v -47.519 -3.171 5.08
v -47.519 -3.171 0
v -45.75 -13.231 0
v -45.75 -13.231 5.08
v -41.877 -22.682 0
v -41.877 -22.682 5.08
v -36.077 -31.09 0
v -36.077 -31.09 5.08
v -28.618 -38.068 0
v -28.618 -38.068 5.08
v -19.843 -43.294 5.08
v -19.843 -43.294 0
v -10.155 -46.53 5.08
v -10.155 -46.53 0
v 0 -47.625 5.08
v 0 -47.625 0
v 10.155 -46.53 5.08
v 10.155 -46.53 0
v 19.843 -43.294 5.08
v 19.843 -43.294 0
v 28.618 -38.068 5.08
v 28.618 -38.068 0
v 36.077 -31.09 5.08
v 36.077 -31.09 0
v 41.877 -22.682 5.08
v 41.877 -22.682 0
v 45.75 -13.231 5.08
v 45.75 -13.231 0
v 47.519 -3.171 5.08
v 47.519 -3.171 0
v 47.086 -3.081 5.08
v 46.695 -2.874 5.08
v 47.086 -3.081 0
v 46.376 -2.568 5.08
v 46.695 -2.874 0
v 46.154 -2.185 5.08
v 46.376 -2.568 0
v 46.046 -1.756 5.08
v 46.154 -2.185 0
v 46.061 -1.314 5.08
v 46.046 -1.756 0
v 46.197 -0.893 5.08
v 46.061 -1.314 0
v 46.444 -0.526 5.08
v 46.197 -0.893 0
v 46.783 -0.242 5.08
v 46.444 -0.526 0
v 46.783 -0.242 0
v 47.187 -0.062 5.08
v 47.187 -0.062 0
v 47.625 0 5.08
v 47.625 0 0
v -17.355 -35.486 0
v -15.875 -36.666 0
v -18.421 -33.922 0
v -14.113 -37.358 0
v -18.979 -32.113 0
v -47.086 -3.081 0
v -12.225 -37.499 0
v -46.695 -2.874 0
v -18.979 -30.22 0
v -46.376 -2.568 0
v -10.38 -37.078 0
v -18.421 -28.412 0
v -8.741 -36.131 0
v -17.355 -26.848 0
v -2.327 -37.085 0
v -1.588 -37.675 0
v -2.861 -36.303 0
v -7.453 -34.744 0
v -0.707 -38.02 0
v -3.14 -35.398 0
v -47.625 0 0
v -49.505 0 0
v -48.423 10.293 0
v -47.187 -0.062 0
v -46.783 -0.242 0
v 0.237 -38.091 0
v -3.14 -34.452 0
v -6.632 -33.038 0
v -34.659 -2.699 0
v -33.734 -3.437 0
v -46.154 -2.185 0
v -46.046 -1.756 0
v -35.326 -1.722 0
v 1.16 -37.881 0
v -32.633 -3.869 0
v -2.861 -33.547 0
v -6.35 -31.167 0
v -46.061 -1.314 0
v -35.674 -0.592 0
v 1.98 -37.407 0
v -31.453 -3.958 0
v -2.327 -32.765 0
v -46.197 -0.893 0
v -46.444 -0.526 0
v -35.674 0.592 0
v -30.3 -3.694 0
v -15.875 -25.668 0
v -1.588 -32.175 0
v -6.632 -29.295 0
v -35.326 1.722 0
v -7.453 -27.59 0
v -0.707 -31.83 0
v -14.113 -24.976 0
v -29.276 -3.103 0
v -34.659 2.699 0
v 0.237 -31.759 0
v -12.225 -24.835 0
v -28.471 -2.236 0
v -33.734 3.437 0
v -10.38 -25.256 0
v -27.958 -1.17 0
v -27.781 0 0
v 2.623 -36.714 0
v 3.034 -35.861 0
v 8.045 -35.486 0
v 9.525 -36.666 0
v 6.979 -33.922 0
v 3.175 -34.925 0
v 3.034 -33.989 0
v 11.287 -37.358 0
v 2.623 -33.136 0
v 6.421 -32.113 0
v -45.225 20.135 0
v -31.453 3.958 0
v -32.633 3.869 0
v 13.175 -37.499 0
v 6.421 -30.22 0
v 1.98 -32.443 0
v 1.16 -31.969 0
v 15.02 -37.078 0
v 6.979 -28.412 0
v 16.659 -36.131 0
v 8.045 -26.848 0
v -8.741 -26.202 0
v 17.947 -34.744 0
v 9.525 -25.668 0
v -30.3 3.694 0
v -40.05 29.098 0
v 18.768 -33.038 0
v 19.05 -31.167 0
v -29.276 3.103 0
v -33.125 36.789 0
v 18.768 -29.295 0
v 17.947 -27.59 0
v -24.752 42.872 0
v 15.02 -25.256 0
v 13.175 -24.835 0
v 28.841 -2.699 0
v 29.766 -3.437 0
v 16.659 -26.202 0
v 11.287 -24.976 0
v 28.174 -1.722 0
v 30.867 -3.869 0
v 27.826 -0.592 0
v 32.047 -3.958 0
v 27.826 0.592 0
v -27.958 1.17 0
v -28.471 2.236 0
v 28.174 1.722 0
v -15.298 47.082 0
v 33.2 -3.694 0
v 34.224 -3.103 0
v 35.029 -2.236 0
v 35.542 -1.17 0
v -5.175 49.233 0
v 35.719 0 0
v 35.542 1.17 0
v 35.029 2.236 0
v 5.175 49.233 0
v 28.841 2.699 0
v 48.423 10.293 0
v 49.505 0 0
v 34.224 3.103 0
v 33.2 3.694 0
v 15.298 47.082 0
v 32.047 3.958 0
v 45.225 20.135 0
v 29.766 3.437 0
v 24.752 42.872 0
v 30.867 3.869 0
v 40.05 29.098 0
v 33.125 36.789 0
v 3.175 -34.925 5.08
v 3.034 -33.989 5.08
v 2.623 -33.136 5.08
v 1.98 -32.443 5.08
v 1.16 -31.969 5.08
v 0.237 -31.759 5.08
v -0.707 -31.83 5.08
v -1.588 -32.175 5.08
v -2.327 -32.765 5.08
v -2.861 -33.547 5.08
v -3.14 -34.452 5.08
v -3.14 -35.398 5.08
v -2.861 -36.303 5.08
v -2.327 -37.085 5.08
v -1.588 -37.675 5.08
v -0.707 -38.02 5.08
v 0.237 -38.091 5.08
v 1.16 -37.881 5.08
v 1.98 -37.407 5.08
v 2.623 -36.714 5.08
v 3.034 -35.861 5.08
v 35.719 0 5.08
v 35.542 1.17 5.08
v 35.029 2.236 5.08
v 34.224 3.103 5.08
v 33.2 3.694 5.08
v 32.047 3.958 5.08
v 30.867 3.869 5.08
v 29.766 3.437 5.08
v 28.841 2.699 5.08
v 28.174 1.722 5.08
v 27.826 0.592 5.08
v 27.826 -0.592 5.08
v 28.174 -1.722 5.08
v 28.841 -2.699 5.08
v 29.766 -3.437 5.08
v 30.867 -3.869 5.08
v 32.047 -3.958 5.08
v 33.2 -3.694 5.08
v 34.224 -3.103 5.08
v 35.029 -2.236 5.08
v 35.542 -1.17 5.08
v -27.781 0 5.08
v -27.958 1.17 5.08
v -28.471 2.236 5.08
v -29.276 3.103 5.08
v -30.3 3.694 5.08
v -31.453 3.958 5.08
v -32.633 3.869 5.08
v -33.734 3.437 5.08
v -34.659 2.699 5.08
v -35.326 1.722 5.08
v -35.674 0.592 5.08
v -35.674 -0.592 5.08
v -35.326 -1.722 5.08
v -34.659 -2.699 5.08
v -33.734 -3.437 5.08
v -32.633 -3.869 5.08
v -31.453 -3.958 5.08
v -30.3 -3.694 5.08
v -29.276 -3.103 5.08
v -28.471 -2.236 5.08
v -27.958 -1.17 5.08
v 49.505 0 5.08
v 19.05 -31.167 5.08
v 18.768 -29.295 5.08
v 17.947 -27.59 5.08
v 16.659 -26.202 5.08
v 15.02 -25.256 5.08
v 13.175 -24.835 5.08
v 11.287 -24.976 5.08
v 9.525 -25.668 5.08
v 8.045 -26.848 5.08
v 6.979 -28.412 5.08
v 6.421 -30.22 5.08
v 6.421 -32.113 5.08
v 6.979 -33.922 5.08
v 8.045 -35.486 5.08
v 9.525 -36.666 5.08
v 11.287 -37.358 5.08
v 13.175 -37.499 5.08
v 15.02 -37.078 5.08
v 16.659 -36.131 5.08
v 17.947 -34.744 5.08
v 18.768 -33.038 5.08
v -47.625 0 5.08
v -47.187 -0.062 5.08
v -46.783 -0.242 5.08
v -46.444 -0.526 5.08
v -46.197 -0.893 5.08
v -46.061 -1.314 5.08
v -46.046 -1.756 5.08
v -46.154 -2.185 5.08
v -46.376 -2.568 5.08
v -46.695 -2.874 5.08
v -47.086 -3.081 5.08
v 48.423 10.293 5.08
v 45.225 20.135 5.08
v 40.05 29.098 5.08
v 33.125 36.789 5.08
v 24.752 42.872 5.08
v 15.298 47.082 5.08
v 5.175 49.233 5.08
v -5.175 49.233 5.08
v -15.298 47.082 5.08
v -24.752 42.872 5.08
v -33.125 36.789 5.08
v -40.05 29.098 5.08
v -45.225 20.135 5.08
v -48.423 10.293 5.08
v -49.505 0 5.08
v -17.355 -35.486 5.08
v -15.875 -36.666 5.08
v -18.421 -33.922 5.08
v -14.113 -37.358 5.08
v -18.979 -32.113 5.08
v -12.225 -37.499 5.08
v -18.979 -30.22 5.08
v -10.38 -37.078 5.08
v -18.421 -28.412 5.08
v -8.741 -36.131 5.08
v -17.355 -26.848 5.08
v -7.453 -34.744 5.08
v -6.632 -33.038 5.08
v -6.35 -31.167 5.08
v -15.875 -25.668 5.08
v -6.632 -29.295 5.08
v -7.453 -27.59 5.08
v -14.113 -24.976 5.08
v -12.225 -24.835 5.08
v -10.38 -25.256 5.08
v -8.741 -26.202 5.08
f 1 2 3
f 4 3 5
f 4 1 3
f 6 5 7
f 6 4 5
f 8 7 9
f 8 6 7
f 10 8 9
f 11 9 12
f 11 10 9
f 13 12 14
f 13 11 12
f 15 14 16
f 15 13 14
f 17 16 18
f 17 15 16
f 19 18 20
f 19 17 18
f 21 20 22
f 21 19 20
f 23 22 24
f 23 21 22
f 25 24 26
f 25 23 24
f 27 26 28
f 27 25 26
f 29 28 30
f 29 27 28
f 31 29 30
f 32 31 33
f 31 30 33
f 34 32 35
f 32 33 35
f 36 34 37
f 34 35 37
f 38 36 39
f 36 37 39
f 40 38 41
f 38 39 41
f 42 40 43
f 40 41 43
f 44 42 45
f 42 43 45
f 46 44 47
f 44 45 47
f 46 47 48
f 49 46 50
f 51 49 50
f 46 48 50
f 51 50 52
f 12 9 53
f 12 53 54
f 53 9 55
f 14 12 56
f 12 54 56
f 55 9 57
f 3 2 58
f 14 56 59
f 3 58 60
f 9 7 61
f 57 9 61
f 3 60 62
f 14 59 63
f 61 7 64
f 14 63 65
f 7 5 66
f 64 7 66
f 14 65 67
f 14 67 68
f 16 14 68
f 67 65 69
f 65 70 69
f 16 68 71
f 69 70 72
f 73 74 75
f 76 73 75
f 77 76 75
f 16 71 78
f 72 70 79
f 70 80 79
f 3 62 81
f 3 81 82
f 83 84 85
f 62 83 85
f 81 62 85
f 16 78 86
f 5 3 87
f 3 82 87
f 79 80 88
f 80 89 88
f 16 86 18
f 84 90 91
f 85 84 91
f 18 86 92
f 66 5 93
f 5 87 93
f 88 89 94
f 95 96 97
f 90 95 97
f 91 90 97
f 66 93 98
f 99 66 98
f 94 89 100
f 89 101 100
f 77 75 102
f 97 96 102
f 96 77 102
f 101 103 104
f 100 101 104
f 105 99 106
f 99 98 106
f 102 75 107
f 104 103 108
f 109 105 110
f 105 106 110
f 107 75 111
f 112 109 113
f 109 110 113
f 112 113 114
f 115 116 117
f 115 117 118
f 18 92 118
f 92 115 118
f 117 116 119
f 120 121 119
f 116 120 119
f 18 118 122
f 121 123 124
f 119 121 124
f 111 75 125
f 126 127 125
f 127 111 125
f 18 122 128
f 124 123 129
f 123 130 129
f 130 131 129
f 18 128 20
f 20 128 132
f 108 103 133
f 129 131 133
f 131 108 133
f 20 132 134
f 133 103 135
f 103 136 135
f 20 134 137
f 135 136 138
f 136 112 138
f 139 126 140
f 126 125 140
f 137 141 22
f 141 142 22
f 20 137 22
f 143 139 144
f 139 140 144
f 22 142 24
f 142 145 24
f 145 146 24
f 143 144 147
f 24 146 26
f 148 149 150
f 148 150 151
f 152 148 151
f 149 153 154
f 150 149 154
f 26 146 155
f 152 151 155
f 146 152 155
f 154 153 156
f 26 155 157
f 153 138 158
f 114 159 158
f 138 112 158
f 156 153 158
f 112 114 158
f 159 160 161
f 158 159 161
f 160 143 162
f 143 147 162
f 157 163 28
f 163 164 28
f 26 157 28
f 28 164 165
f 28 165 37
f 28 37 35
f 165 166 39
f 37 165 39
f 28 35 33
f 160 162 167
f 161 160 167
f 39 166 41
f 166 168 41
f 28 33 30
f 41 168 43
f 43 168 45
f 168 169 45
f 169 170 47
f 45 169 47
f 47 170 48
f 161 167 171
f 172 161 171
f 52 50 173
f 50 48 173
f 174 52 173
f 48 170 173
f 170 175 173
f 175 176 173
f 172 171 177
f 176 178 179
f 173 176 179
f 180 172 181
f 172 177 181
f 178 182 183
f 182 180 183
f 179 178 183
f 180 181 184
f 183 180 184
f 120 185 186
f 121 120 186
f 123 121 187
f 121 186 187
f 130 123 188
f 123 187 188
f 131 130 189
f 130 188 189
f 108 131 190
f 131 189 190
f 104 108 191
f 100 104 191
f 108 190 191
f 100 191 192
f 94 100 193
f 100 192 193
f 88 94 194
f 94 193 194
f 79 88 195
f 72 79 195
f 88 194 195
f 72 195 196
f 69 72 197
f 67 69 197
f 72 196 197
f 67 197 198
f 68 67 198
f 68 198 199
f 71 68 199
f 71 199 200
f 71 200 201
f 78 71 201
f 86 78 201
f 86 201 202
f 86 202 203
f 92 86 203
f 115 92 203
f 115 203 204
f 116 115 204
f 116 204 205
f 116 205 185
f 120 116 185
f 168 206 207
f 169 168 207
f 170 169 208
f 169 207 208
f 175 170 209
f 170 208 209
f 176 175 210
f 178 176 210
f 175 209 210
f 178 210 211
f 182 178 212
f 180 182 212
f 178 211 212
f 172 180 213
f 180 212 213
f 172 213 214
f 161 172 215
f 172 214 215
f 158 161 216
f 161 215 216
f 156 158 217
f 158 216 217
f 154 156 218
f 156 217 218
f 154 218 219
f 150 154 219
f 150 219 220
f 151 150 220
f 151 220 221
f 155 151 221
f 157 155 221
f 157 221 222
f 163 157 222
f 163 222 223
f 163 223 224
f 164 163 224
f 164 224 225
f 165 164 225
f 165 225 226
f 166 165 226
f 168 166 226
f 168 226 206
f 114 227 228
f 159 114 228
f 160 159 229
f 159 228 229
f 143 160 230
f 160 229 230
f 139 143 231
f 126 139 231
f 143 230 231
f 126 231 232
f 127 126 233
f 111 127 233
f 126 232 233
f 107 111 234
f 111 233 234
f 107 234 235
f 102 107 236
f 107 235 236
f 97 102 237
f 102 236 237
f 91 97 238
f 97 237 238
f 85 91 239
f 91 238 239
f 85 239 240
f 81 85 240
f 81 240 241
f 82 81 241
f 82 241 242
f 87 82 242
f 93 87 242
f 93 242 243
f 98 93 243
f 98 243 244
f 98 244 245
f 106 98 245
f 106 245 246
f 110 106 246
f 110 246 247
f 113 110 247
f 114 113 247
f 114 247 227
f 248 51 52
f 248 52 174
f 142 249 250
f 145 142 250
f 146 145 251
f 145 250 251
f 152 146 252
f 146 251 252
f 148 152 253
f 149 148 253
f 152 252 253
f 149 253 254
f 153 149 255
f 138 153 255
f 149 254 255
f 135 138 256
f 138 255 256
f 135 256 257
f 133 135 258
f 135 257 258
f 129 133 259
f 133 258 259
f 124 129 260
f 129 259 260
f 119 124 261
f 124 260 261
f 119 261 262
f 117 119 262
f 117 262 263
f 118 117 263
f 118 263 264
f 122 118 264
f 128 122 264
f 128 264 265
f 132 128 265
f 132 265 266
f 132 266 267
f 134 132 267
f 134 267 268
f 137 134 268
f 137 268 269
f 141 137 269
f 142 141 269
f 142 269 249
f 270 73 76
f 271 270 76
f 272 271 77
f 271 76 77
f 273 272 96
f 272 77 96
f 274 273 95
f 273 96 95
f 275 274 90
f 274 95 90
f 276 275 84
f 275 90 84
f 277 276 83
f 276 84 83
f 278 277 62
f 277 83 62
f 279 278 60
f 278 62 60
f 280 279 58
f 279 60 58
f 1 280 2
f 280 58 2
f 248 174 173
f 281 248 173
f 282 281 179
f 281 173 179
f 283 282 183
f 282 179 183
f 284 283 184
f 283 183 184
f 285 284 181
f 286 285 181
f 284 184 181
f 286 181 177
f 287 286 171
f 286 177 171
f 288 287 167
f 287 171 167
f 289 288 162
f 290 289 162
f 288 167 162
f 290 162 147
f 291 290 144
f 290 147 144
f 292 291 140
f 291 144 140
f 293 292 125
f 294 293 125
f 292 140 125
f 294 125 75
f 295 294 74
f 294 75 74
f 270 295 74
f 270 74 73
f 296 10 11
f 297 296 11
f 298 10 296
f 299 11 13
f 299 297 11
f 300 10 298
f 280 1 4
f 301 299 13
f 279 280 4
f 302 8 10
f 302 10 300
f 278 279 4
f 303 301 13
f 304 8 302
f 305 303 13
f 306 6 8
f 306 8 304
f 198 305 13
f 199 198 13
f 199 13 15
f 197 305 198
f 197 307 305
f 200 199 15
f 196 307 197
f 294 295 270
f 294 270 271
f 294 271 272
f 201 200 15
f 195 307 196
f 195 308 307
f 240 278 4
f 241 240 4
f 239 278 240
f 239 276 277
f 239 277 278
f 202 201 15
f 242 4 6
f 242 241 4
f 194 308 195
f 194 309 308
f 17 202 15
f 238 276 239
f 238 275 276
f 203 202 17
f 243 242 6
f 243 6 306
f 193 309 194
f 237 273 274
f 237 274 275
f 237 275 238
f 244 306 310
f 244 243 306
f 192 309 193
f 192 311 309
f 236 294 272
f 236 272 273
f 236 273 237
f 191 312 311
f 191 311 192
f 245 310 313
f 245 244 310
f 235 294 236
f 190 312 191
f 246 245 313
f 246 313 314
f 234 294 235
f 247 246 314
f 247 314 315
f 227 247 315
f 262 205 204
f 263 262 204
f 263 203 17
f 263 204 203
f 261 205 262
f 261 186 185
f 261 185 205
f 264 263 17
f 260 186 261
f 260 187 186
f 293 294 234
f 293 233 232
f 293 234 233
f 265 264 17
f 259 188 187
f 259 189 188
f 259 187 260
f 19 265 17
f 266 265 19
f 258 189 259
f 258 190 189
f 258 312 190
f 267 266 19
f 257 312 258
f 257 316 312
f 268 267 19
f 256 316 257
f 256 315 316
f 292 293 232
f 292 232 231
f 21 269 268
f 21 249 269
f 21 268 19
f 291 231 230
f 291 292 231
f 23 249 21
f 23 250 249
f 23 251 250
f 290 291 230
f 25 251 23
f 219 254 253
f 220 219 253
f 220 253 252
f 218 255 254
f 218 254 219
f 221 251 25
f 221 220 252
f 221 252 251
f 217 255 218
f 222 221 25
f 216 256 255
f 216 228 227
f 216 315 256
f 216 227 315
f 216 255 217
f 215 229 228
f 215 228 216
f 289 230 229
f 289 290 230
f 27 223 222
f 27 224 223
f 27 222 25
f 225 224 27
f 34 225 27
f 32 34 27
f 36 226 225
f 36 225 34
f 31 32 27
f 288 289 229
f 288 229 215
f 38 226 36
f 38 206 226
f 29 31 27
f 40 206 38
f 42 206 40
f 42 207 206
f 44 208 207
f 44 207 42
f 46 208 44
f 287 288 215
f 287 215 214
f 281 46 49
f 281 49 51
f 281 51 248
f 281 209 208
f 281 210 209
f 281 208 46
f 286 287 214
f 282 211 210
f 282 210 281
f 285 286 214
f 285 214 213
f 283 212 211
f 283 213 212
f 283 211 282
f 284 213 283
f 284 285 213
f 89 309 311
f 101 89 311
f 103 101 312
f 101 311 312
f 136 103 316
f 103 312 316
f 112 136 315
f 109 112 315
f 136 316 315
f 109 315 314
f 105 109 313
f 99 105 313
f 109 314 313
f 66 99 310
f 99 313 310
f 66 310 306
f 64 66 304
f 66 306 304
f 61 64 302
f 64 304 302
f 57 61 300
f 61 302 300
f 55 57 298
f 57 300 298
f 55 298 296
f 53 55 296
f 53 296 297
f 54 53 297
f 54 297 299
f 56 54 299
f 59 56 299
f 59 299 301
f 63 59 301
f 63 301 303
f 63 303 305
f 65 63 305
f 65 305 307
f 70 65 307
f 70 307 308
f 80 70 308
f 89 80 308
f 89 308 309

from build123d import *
from build123d.topology import SkipClean

# Parameters (mm, degrees)
SKETCH1_R           = 49.5046
BOSS_EXTRUDE1_DEPTH = 5.08
SKETCH2_R           = 47.625
BOSS_EXTRUDE2_DEPTH = 3.175
SKETCH3_R           = 3.96875
SKETCH3_R_2         = 6.35
CUT_EXTRUDE1_DEPTH  = 71.495076901
CUT_EXTRUDE2_DEPTH  = 71.194139658
SKETCH5_R           = 54.412278645
CUT_EXTRUDE3_DEPTH  = 3.175
SKETCH6_R           = 1.5875
CUT_EXTRUDE4_DEPTH  = 71.194139658
SKETCH7_R           = 3.175
CUT_EXTRUDE5_DEPTH  = 71.194139658


with BuildPart() as part:
    # Sketch1 → Boss-Extrude1 (new body)
    with BuildSketch(Plane.XY):
        Circle(SKETCH1_R)
    extrude(amount=BOSS_EXTRUDE1_DEPTH)

    # Sketch2 → Boss-Extrude2 (add)
    with BuildSketch(Plane.XY.offset(5.08)):
        Circle(SKETCH2_R)
    extrude(amount=BOSS_EXTRUDE2_DEPTH)

    # Sketch3 → Cut-Extrude1 (cut, through all)
    with BuildSketch(Plane.XY.offset(8.255)):
        with Locations((-31.75, 0)):
            Circle(SKETCH3_R)
        with Locations((31.75, 0)):
            Circle(SKETCH3_R)
        with Locations((-12.7, -31.166793627)):
            Circle(SKETCH3_R_2)
        with Locations((12.7, -31.166793627)):
            Circle(SKETCH3_R_2)
    extrude(amount=-CUT_EXTRUDE1_DEPTH, mode=Mode.SUBTRACT)

    # Sketch4 → Cut-Extrude2 (cut, through all)
    with SkipClean():  # the faces are left unmerged after this step: merging them gives an invalid solid
        with BuildSketch(Plane.XY.offset(5.08)):
            with BuildLine():
                Line((-50.165, 0), (-47.625, 0))
                ThreePointArc((-47.625, 0), (0, -47.625), (47.625, 0))
                Line((47.625, 0), (50.165, 0))
                ThreePointArc((50.165, 0), (0, -50.165), (-50.165, 0))
            make_face()
        extrude(amount=-CUT_EXTRUDE2_DEPTH, mode=Mode.SUBTRACT)

    # Sketch5 → Cut-Extrude3 (cut)
    with BuildSketch(Plane.XY.offset(8.255)):
        Circle(SKETCH5_R)
    extrude(amount=-CUT_EXTRUDE3_DEPTH, mode=Mode.SUBTRACT)

    # Sketch6 → Cut-Extrude4 (cut, through all)
    with BuildSketch(Plane(origin=(0, 0, 0), x_dir=(-1, 0, 0), z_dir=(0, 0, -1))):
        with Locations((-47.625, -1.5875)):
            Circle(SKETCH6_R)
        with Locations((47.625, -1.5875)):
            Circle(SKETCH6_R)
    extrude(amount=-CUT_EXTRUDE4_DEPTH, mode=Mode.SUBTRACT)

    # Sketch7 → Cut-Extrude5 (cut, through all)
    with BuildSketch(Plane.XY.offset(5.08)):
        with Locations((0, -34.925)):
            Circle(SKETCH7_R)
    extrude(amount=-CUT_EXTRUDE5_DEPTH, mode=Mode.SUBTRACT)


solid = part.part
